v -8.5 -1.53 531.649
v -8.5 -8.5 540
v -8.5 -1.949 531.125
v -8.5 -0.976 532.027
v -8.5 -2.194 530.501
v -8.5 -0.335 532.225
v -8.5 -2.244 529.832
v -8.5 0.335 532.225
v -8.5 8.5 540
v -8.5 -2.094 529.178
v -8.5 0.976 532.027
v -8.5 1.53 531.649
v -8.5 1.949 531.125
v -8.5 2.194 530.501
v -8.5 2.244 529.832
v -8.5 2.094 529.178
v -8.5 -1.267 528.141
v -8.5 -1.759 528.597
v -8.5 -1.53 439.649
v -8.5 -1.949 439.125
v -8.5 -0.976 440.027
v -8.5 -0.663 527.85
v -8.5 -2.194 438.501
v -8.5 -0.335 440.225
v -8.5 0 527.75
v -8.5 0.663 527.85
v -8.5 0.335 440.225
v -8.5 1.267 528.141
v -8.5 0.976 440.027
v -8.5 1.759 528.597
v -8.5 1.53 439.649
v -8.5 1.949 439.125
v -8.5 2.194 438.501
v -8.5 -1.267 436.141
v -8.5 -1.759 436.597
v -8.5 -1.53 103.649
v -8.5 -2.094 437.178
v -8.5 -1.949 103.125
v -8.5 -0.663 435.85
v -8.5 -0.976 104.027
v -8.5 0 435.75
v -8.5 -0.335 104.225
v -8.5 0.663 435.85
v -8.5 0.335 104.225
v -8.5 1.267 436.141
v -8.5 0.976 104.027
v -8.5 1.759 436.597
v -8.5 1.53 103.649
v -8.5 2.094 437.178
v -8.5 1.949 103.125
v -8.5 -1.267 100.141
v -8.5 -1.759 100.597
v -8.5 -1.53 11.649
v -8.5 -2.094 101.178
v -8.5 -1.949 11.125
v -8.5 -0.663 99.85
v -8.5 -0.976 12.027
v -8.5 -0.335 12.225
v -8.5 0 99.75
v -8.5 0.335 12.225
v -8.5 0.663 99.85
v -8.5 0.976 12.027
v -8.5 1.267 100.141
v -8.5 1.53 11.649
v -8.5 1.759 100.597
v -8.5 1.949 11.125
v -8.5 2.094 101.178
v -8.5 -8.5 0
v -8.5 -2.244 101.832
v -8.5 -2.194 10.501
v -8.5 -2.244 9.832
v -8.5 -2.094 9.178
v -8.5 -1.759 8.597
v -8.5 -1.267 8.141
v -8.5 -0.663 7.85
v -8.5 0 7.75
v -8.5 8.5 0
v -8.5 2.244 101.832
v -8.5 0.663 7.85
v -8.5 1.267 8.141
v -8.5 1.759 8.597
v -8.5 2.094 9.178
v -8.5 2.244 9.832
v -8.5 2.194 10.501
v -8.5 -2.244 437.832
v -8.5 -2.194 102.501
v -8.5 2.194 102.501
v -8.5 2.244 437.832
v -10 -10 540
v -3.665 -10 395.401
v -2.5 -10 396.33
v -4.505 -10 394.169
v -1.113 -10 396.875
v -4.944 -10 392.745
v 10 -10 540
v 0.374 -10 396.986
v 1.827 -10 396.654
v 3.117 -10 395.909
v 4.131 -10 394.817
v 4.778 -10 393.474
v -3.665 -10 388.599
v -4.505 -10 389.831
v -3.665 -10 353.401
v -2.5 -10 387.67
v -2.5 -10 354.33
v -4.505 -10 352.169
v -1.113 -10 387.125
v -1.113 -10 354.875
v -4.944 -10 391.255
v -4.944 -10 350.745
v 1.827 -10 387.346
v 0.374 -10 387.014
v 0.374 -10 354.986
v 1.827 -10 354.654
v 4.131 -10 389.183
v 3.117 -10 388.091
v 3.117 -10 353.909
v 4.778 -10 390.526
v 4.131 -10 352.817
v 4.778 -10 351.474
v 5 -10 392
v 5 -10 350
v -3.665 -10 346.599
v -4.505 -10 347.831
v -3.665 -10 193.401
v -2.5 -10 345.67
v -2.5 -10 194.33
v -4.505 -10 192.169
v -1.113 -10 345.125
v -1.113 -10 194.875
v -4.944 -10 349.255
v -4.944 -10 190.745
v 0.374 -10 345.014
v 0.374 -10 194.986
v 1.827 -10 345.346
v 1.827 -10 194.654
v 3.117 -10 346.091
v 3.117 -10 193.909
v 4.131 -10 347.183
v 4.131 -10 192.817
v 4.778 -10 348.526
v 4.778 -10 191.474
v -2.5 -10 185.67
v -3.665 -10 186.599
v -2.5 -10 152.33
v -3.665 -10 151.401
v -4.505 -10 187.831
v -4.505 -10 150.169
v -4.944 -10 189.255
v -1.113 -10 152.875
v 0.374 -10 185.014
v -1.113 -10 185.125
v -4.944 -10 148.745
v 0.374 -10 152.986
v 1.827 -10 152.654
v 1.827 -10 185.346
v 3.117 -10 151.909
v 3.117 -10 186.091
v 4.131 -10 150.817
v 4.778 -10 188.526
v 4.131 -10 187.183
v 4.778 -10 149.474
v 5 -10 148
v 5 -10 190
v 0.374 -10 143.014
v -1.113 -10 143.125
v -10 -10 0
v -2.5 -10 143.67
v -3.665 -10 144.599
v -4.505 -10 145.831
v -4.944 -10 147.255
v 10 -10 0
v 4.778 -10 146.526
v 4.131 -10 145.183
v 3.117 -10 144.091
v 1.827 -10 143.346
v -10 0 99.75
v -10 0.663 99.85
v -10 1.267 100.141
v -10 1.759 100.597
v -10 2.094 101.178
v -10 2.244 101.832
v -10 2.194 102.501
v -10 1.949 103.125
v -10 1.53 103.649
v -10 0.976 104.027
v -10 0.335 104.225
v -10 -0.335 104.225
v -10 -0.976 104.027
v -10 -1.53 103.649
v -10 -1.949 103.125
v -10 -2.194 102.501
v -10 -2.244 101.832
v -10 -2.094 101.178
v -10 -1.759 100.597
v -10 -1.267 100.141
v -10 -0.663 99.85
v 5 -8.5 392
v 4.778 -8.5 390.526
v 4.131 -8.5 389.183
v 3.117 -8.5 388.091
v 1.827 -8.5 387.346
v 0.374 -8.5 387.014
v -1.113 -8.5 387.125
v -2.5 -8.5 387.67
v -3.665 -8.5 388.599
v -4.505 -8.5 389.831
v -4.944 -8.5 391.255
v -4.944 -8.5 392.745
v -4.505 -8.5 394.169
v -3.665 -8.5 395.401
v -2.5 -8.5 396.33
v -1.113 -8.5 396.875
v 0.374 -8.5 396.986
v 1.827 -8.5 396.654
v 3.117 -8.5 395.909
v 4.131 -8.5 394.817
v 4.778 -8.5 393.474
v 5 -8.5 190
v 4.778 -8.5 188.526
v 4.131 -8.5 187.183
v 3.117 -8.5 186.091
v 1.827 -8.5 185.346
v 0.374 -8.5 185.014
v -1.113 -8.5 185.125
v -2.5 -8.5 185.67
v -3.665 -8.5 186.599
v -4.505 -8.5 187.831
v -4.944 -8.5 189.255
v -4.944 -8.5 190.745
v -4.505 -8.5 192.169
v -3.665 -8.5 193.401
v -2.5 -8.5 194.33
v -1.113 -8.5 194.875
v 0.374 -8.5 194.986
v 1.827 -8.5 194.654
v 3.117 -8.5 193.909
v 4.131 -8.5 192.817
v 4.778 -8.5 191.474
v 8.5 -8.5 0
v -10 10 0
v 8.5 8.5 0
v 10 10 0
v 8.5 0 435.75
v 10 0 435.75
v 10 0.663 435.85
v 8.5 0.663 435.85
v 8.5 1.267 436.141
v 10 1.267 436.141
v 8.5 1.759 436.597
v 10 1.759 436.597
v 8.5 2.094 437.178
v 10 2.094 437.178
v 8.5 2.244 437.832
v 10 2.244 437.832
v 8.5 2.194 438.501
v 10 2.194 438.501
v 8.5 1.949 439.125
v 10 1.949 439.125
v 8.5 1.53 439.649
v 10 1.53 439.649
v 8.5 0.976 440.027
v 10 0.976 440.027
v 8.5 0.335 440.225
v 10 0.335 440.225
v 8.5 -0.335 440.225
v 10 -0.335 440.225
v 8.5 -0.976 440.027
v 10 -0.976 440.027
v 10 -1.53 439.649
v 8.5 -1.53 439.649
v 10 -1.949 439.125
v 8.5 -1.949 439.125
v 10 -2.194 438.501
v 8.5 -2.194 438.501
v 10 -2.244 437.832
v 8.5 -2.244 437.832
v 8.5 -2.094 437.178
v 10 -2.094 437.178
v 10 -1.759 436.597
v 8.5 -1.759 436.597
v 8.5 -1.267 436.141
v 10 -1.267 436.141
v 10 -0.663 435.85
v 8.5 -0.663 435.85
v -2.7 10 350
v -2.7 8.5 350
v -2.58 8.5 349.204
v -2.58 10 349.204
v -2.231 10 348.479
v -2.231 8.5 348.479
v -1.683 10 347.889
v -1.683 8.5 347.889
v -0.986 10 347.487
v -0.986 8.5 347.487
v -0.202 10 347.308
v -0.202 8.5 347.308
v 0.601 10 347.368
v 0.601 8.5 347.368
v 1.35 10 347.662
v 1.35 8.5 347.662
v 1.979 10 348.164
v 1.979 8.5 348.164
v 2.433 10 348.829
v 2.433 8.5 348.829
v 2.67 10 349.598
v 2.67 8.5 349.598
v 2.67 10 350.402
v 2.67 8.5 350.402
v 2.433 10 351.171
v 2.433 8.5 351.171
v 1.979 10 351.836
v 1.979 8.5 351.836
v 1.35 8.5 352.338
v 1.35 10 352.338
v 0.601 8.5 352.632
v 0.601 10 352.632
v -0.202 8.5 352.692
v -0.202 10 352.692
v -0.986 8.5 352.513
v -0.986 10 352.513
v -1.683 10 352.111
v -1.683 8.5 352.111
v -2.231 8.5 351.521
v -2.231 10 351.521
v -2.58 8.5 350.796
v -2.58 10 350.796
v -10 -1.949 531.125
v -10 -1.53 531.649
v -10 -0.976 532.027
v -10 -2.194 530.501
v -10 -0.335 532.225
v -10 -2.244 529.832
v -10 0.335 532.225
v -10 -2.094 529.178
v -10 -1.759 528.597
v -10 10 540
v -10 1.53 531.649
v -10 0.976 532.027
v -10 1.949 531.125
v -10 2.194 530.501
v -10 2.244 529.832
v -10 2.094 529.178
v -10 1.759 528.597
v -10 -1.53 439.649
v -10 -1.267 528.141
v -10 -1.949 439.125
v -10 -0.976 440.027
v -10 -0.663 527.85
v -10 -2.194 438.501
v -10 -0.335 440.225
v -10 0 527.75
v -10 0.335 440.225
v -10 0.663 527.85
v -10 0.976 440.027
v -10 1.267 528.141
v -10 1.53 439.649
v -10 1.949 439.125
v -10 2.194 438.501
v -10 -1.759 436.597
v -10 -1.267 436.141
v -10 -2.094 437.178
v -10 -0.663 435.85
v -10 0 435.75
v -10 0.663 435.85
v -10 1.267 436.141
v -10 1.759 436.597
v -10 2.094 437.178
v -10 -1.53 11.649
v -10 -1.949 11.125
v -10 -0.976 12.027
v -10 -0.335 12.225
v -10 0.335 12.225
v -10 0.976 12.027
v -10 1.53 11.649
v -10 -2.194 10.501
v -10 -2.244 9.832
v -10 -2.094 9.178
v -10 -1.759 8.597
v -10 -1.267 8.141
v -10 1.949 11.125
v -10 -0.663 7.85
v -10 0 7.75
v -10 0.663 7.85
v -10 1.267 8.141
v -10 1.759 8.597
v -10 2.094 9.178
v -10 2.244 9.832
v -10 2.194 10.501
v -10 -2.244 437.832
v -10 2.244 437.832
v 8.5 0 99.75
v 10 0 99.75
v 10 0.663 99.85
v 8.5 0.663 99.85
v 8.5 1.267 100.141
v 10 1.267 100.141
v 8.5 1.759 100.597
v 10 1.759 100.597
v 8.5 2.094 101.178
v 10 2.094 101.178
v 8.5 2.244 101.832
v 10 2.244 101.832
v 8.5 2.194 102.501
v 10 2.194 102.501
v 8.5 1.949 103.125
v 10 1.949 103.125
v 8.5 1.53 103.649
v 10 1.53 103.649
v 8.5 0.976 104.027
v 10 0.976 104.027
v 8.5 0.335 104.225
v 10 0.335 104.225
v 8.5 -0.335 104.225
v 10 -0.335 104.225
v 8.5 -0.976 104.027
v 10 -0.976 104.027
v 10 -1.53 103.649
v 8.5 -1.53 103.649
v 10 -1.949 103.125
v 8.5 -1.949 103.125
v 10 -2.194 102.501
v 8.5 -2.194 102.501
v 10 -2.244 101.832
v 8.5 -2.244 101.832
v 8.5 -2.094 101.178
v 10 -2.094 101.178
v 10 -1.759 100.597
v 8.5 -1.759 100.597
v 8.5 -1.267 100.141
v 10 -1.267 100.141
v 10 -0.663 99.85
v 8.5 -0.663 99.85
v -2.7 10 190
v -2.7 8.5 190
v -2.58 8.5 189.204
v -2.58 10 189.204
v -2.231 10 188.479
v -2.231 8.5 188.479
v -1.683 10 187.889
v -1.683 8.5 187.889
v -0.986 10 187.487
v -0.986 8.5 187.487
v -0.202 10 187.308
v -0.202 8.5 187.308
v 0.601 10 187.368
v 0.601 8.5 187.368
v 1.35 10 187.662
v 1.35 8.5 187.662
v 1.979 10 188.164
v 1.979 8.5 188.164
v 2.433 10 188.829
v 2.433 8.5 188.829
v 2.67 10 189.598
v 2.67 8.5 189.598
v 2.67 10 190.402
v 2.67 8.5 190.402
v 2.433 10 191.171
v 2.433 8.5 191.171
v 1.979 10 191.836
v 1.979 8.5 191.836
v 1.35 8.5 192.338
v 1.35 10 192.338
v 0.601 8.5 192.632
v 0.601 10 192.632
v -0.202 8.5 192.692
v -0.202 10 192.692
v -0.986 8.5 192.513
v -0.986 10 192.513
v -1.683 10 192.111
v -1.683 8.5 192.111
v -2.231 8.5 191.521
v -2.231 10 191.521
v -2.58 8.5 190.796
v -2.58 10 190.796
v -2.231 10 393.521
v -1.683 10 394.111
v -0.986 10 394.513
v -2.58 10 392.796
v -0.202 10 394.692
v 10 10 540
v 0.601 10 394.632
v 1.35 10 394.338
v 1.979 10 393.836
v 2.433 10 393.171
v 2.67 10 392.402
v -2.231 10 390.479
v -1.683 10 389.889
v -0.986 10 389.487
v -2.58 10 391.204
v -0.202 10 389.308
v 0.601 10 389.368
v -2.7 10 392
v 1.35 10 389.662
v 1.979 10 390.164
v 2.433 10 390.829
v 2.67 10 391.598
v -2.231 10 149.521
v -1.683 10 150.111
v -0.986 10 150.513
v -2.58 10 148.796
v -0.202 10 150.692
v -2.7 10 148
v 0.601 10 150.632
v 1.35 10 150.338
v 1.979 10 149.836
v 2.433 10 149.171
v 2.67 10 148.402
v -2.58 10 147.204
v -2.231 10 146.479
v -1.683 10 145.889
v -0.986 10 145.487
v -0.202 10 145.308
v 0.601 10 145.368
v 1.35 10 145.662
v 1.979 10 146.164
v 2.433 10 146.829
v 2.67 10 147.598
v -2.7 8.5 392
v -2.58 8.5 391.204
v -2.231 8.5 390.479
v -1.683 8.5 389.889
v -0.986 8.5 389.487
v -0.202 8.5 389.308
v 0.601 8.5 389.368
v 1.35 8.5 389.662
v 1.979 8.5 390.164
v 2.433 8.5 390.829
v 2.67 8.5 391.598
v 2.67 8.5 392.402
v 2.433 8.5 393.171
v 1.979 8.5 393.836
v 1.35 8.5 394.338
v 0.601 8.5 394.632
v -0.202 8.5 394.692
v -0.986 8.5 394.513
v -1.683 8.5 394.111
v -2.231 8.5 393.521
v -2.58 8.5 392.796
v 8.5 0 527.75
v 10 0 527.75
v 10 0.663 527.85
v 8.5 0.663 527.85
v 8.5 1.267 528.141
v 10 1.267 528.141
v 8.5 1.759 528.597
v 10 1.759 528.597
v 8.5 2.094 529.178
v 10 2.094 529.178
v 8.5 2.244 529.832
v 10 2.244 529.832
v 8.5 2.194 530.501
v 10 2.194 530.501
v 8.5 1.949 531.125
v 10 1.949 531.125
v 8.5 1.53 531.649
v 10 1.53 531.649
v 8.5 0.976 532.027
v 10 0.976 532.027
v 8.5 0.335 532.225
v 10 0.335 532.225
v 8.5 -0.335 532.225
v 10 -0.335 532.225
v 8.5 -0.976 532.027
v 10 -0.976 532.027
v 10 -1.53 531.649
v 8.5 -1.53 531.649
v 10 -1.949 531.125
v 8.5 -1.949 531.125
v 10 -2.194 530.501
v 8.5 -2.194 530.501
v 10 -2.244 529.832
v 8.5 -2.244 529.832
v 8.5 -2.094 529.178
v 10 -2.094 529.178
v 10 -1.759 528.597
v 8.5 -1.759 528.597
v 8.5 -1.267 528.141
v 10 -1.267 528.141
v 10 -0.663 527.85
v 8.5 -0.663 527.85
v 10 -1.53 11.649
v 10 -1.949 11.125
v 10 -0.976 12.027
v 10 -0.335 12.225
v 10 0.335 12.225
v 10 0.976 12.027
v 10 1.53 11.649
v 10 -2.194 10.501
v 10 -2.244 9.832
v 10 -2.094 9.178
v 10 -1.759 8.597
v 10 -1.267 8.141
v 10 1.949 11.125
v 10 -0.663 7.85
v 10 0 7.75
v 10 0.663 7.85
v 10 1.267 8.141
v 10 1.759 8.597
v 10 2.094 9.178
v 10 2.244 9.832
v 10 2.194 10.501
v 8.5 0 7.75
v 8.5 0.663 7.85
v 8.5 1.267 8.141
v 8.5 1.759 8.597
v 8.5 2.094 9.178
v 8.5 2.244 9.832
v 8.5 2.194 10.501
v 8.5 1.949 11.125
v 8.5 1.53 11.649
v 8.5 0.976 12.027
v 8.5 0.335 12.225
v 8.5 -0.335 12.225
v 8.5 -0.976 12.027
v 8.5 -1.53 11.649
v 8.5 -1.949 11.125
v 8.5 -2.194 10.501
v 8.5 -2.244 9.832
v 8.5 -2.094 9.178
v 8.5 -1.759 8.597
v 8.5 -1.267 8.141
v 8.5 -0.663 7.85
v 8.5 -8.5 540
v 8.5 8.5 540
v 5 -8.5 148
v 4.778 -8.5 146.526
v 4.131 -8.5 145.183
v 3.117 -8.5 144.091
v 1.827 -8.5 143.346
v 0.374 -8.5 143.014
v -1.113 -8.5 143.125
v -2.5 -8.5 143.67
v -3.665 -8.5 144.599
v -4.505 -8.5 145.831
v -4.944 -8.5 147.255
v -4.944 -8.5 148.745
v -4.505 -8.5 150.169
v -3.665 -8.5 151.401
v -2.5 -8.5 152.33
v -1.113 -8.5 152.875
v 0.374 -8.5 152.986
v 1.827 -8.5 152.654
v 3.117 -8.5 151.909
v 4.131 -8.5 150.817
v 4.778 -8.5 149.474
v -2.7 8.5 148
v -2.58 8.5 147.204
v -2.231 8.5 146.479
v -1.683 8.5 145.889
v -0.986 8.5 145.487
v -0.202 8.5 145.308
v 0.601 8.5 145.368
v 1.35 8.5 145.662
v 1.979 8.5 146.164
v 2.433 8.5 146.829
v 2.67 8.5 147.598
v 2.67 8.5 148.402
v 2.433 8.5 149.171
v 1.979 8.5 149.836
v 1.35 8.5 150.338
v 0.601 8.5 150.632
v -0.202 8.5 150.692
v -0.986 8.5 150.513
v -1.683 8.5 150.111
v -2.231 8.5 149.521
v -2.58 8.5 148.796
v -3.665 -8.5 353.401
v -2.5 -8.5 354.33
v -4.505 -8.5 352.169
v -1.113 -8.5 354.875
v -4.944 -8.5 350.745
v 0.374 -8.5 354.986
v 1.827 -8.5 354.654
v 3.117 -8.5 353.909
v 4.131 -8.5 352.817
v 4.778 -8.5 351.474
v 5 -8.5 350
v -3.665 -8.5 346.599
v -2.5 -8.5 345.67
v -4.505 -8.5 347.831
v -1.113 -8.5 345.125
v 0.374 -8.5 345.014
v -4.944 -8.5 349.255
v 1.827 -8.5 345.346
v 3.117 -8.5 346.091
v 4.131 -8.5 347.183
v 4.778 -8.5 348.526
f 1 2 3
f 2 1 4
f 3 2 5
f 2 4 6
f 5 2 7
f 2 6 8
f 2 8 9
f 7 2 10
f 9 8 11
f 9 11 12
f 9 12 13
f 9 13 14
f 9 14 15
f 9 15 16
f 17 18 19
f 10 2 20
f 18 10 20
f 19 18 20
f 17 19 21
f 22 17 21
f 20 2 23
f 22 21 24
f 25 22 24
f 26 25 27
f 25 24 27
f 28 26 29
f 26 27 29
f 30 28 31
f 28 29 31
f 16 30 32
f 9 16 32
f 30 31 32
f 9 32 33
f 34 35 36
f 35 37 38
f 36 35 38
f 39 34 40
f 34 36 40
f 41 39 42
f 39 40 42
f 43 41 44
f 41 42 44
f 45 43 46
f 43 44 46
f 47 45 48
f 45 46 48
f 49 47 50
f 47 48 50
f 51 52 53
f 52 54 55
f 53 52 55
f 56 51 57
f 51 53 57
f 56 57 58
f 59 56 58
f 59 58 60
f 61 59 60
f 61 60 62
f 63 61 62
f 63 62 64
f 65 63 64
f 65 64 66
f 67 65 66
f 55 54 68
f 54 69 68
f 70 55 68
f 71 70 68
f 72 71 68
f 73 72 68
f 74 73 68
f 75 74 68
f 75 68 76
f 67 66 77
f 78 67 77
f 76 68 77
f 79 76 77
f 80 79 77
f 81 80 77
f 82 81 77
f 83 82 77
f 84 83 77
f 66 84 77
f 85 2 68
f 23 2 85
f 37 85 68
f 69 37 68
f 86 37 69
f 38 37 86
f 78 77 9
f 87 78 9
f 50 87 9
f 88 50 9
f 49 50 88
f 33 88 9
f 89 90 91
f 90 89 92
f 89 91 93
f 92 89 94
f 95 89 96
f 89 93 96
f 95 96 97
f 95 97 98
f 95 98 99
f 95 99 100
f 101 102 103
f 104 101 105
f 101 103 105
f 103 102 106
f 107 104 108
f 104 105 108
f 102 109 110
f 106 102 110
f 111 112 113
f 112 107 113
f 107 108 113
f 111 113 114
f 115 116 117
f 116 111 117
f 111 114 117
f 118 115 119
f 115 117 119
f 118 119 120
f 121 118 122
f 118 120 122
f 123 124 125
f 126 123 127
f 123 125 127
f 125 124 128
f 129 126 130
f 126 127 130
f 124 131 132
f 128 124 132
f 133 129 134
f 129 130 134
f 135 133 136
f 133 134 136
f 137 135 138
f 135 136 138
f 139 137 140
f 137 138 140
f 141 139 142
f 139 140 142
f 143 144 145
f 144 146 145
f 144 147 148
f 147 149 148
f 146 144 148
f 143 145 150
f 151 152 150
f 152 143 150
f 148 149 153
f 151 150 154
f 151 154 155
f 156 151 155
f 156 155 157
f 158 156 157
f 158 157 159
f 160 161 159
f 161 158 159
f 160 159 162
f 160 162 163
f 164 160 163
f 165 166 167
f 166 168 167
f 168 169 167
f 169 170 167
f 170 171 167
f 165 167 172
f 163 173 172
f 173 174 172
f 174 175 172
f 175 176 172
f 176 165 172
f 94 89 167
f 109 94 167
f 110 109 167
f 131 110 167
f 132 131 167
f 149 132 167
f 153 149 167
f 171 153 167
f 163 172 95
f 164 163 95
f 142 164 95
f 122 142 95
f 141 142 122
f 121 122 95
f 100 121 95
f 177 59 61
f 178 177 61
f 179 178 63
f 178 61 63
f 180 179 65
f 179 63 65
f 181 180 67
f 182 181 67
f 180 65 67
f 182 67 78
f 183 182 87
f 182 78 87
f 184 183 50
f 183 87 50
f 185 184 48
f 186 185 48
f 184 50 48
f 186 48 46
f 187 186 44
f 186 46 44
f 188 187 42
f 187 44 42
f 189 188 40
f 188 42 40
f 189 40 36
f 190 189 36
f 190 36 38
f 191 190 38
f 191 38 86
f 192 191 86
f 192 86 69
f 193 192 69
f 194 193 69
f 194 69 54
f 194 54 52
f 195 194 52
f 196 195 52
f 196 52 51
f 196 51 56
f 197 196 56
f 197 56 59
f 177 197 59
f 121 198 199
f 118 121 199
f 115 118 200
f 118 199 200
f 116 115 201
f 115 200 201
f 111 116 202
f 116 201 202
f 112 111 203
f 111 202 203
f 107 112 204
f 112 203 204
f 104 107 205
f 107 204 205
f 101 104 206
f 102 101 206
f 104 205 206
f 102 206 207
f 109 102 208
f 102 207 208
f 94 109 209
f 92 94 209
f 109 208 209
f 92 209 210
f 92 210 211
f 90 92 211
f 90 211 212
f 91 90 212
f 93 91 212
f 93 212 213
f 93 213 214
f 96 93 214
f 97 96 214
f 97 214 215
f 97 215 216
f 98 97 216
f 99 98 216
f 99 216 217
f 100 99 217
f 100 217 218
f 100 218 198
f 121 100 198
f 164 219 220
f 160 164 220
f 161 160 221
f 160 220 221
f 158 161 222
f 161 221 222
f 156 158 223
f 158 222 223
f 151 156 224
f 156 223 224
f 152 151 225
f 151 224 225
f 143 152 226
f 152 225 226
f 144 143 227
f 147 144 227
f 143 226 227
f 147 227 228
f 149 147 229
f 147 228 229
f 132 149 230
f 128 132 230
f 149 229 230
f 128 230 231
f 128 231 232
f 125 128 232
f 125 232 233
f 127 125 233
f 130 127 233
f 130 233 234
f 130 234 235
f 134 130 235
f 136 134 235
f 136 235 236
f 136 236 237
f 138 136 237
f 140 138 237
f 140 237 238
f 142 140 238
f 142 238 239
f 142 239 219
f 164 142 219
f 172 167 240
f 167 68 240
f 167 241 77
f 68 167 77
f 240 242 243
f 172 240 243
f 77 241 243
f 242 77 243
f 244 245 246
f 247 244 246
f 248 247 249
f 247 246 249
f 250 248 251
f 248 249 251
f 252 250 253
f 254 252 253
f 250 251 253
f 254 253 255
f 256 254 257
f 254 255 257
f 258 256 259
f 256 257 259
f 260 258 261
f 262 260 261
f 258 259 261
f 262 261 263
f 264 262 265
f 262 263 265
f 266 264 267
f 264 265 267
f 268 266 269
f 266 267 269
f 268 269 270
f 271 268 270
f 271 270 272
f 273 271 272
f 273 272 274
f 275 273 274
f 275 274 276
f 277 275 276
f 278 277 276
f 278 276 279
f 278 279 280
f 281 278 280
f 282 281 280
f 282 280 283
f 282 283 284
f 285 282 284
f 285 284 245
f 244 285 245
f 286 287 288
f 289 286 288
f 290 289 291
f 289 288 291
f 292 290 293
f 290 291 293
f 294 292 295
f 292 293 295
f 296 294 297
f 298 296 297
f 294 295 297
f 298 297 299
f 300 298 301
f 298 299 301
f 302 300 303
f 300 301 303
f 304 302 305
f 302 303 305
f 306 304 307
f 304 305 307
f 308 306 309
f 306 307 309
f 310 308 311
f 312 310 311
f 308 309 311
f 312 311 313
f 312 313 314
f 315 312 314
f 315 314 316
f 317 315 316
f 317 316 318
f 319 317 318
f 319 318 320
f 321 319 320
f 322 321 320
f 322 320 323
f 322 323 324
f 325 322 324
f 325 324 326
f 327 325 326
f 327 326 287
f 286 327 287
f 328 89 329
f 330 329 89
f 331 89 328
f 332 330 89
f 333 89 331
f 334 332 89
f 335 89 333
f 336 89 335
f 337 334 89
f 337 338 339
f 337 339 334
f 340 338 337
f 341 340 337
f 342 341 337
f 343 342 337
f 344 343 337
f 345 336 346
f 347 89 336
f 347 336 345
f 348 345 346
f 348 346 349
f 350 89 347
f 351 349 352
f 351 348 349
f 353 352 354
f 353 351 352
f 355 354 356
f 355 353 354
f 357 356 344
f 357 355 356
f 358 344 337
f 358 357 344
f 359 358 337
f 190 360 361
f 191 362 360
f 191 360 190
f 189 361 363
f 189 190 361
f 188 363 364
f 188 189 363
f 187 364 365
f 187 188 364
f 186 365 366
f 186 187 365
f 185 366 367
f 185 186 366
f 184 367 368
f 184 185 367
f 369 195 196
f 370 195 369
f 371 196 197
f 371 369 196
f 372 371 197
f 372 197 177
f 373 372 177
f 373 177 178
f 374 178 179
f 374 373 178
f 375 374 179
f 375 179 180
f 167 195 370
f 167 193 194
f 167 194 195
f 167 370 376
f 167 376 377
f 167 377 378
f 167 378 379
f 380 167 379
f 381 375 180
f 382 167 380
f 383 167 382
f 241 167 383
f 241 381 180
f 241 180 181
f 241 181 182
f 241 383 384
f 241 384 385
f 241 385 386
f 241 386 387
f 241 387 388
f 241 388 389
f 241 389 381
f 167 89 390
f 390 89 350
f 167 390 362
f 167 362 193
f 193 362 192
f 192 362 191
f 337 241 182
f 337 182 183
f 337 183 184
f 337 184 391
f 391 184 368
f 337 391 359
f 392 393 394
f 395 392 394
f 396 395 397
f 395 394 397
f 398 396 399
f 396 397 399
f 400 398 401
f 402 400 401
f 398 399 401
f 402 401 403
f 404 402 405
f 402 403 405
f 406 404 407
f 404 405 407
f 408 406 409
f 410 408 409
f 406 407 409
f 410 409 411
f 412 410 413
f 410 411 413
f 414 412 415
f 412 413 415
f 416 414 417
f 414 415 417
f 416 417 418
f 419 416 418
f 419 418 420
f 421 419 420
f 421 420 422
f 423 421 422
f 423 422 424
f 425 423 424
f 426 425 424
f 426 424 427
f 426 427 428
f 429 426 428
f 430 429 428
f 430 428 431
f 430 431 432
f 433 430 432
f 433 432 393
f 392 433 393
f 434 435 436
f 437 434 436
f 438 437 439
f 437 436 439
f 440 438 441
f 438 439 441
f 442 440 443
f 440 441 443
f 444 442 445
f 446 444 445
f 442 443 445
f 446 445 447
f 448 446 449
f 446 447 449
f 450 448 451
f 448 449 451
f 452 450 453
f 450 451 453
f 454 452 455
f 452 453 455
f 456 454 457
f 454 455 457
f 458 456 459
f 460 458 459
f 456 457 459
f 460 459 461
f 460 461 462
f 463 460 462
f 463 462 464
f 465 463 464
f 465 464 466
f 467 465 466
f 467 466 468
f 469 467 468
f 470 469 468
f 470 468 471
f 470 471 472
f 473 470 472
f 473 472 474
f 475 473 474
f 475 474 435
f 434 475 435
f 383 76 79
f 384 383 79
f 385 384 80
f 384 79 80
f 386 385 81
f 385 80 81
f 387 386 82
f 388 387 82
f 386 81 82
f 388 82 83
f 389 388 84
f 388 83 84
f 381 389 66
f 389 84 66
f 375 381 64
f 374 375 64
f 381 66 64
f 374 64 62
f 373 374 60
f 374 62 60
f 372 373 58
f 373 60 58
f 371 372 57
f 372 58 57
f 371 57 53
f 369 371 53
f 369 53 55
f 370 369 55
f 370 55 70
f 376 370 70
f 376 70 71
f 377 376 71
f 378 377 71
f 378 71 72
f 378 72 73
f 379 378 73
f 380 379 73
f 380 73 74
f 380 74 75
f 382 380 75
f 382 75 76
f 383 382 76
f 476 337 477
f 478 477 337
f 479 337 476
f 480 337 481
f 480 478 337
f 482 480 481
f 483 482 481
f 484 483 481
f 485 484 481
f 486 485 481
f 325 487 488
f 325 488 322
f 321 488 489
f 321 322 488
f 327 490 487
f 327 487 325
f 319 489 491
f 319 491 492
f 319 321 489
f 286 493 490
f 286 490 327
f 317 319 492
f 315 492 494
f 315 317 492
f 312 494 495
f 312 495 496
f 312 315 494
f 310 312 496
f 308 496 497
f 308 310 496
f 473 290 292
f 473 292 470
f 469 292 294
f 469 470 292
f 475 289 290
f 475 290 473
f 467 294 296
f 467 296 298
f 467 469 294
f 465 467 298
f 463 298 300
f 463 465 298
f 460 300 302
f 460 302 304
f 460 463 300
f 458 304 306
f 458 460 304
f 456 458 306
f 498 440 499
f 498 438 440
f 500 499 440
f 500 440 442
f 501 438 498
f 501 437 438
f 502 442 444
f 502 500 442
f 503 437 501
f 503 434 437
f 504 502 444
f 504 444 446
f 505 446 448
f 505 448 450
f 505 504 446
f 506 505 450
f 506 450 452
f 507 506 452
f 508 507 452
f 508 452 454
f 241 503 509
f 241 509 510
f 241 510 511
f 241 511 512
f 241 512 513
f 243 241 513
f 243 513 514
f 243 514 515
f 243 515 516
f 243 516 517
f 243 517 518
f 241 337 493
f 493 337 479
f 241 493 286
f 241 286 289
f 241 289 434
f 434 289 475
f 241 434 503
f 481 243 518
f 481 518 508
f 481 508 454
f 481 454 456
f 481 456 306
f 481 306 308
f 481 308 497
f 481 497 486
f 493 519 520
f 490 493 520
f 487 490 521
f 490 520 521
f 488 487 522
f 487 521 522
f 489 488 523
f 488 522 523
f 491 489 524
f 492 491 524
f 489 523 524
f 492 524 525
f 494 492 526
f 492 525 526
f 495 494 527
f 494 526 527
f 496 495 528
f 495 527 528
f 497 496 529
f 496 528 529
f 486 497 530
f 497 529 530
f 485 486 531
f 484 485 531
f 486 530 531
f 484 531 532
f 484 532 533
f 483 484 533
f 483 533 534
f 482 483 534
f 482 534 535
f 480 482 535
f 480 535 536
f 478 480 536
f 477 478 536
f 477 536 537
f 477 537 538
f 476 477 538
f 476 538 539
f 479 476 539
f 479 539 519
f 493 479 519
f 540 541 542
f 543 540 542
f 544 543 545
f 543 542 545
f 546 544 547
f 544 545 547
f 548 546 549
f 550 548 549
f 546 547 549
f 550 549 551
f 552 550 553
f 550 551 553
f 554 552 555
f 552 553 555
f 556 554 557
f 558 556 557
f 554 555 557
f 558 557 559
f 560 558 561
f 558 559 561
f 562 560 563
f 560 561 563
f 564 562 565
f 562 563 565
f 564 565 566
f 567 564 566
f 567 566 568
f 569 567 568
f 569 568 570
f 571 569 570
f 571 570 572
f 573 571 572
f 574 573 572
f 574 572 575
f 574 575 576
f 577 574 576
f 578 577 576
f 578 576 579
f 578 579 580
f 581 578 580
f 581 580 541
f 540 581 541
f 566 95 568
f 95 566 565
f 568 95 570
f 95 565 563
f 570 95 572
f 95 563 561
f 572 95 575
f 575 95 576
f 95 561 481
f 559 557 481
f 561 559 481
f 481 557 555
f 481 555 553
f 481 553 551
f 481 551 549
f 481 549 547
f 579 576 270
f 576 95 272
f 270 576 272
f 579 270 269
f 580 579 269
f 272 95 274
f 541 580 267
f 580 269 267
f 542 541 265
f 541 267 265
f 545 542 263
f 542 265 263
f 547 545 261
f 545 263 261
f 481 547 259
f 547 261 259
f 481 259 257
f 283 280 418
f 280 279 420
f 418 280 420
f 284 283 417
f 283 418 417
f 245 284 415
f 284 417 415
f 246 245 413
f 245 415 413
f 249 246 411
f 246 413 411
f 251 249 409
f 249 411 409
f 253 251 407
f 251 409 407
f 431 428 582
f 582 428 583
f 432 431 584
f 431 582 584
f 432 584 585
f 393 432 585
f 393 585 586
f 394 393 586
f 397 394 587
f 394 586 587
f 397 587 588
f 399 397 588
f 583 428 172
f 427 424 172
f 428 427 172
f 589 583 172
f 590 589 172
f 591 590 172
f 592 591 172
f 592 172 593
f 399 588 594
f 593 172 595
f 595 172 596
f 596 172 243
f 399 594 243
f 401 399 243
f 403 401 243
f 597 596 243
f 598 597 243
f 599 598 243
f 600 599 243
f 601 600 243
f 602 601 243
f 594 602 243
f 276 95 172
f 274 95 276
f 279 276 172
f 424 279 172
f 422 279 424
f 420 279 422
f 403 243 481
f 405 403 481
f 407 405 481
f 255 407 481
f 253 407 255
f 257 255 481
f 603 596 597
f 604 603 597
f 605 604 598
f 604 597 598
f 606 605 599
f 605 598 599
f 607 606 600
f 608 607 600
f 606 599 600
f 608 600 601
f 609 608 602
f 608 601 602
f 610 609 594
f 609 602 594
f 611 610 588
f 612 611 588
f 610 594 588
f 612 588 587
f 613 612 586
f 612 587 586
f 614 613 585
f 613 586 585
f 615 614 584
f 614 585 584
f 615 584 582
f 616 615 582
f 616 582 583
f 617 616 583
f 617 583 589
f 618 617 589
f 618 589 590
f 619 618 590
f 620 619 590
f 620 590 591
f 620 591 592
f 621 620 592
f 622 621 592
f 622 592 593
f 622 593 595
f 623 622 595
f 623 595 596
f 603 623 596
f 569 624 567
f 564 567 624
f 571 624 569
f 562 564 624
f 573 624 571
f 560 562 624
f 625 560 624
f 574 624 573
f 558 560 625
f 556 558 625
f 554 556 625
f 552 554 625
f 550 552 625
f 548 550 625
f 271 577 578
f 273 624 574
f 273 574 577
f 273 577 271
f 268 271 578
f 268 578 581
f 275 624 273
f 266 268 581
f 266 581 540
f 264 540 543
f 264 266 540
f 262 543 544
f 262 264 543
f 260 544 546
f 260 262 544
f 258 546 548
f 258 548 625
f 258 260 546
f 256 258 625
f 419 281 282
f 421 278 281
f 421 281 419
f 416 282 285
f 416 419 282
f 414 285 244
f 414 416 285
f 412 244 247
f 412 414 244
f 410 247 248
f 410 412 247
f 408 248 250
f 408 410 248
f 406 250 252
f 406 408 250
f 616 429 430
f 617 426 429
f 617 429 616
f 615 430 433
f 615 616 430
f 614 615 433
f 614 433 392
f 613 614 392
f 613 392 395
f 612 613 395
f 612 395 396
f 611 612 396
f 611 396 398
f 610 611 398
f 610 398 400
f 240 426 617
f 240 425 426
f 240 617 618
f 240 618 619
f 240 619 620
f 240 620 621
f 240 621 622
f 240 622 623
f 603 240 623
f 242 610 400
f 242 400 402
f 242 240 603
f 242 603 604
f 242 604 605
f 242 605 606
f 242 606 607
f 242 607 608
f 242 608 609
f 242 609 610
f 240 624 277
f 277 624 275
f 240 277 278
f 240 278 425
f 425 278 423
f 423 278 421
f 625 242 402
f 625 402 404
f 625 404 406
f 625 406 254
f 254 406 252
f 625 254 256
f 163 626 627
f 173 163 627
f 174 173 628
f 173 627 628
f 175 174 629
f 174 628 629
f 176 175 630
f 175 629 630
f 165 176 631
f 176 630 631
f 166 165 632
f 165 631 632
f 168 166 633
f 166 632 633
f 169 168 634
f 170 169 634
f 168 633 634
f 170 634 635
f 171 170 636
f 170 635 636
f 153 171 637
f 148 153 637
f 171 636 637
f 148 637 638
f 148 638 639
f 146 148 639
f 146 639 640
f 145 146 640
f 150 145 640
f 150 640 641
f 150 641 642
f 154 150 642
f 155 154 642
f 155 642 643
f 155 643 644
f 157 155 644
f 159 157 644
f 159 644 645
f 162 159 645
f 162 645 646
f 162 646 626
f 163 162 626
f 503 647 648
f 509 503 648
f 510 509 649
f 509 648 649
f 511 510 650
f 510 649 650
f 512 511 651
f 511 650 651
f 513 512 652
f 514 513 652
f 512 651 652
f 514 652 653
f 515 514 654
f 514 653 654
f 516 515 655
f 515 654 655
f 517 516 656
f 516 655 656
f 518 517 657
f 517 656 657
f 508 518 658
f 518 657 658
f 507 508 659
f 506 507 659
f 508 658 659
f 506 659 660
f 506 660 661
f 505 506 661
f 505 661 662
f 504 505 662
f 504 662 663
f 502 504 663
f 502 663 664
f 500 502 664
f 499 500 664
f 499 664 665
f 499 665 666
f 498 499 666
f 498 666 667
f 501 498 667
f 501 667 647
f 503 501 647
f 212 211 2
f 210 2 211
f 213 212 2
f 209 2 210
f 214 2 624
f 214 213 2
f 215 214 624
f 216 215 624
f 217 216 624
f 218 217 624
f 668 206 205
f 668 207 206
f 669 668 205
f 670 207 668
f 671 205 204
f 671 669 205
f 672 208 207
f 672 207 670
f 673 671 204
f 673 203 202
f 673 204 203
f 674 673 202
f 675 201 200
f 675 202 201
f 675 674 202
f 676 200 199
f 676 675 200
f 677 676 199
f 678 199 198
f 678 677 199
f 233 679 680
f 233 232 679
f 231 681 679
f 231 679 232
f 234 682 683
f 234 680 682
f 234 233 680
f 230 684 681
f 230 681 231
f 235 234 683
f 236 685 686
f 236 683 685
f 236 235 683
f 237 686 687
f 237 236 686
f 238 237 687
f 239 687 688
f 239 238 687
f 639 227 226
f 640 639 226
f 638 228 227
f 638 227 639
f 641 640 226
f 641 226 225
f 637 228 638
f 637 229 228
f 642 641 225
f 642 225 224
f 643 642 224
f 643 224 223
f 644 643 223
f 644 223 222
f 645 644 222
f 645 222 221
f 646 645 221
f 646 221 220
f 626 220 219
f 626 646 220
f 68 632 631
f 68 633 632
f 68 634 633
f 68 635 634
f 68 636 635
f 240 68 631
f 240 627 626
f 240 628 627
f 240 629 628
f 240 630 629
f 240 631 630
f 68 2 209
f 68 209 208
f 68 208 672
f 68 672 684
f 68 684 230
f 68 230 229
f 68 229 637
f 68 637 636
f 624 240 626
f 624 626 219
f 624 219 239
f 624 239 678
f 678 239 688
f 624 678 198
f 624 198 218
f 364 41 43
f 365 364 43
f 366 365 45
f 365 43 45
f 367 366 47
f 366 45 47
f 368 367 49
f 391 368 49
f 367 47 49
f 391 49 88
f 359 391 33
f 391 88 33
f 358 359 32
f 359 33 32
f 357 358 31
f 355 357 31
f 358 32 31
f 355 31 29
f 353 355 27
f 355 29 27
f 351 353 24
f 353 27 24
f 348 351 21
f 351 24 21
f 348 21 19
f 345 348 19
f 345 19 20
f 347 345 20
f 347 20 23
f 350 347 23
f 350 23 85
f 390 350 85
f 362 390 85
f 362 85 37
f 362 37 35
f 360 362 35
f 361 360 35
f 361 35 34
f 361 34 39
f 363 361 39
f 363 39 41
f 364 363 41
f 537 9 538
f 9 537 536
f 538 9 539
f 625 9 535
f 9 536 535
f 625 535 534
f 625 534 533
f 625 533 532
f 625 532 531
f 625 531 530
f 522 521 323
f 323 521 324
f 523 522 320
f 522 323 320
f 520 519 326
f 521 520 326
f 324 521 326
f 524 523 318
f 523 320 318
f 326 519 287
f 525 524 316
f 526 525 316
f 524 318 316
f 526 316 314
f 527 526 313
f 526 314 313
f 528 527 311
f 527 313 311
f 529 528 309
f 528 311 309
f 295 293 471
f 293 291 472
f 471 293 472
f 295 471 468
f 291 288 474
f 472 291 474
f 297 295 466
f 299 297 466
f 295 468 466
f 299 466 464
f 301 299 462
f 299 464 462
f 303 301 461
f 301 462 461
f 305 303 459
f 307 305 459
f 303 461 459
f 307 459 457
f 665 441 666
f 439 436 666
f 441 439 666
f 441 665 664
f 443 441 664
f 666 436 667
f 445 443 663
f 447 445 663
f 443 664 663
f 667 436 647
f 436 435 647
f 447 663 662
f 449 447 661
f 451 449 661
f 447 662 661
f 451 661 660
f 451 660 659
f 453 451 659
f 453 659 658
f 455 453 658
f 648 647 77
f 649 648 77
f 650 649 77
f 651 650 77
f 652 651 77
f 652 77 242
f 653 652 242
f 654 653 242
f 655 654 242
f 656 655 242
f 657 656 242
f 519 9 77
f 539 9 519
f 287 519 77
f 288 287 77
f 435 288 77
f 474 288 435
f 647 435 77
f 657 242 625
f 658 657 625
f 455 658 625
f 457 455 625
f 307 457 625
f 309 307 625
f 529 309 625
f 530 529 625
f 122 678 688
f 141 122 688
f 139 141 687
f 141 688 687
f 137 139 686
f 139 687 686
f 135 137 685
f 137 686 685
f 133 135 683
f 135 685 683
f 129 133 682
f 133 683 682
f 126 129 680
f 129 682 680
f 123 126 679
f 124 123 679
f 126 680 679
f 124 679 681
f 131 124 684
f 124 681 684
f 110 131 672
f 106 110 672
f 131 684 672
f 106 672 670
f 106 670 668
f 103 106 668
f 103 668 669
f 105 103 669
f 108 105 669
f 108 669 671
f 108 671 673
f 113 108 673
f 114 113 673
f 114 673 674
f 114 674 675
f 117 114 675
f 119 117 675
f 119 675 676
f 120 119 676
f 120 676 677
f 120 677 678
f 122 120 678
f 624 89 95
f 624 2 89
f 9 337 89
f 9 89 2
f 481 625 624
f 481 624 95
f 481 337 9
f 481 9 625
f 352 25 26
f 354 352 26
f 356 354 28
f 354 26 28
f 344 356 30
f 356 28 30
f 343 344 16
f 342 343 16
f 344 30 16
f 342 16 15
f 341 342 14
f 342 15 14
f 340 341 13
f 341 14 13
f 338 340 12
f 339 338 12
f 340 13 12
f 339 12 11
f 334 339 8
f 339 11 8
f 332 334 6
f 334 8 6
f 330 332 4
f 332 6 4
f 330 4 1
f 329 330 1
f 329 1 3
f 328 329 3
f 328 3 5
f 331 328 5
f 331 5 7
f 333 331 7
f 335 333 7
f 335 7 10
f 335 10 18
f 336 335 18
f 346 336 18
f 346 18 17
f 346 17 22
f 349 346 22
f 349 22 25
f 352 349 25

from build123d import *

# Parameters (mm, degrees)
SKETCH_1_W                  = 20
SKETCH_1_H                  = 20
SKETCH_1_W_2                = 17
SKETCH_1_H_2                = 17
EXTRUDE_1_DEPTH             = 540
SKETCH_3_R                  = 2.25
CUT_EXTRUDE_2_DEPTH         = 20
HOLE_WIZARD_5_4_5_4_1_D     = 5.4
HOLE_WIZARD_10_0_10_1_D     = 10
HOLE_WIZARD_10_0_10_1_DEPTH = 1.5


with BuildPart() as part:
    # ｽｹｯﾁ1 → ﾎﾞｽ - 押し出し1 (new body)
    with BuildSketch(Plane.XY):
        Rectangle(SKETCH_1_W, SKETCH_1_H)
        Rectangle(SKETCH_1_W_2, SKETCH_1_H_2, mode=Mode.SUBTRACT)
    extrude(amount=EXTRUDE_1_DEPTH)

    # ｽｹｯﾁ3 → ｶｯﾄ - 押し出し2 (cut)
    with BuildSketch(Plane(origin=(10, 0, 0), x_dir=(0, 0, -1), z_dir=(1, 0, 0))):
        with Locations((-530, 0)):
            Circle(SKETCH_3_R)
        with Locations((-438, 0)):
            Circle(SKETCH_3_R)
        with Locations((-102, 0)):
            Circle(SKETCH_3_R)
        with Locations((-10, 0)):
            Circle(SKETCH_3_R)
    extrude(amount=-CUT_EXTRUDE_2_DEPTH, mode=Mode.SUBTRACT)

    # Ø5.4 (5.4) 直径の穴1 (through all)
    with Locations(Plane(origin=(0, 10, 0), x_dir=(1, 0, 0), z_dir=(0, 1, 0))):
        with Locations((0, -148), (0, -190), (0, -350), (0, -392)):
            Hole(HOLE_WIZARD_5_4_5_4_1_D / 2)

    # Ø10.0 (10) 直径の穴1
    with Locations(Plane(origin=(0, -10, 0), x_dir=(-1, 0, 0), z_dir=(0, -1, 0))):
        with Locations((0, -148), (0, -190), (0, -350), (0, -392)):
            Hole(HOLE_WIZARD_10_0_10_1_D / 2, depth=HOLE_WIZARD_10_0_10_1_DEPTH)


solid = part.part
